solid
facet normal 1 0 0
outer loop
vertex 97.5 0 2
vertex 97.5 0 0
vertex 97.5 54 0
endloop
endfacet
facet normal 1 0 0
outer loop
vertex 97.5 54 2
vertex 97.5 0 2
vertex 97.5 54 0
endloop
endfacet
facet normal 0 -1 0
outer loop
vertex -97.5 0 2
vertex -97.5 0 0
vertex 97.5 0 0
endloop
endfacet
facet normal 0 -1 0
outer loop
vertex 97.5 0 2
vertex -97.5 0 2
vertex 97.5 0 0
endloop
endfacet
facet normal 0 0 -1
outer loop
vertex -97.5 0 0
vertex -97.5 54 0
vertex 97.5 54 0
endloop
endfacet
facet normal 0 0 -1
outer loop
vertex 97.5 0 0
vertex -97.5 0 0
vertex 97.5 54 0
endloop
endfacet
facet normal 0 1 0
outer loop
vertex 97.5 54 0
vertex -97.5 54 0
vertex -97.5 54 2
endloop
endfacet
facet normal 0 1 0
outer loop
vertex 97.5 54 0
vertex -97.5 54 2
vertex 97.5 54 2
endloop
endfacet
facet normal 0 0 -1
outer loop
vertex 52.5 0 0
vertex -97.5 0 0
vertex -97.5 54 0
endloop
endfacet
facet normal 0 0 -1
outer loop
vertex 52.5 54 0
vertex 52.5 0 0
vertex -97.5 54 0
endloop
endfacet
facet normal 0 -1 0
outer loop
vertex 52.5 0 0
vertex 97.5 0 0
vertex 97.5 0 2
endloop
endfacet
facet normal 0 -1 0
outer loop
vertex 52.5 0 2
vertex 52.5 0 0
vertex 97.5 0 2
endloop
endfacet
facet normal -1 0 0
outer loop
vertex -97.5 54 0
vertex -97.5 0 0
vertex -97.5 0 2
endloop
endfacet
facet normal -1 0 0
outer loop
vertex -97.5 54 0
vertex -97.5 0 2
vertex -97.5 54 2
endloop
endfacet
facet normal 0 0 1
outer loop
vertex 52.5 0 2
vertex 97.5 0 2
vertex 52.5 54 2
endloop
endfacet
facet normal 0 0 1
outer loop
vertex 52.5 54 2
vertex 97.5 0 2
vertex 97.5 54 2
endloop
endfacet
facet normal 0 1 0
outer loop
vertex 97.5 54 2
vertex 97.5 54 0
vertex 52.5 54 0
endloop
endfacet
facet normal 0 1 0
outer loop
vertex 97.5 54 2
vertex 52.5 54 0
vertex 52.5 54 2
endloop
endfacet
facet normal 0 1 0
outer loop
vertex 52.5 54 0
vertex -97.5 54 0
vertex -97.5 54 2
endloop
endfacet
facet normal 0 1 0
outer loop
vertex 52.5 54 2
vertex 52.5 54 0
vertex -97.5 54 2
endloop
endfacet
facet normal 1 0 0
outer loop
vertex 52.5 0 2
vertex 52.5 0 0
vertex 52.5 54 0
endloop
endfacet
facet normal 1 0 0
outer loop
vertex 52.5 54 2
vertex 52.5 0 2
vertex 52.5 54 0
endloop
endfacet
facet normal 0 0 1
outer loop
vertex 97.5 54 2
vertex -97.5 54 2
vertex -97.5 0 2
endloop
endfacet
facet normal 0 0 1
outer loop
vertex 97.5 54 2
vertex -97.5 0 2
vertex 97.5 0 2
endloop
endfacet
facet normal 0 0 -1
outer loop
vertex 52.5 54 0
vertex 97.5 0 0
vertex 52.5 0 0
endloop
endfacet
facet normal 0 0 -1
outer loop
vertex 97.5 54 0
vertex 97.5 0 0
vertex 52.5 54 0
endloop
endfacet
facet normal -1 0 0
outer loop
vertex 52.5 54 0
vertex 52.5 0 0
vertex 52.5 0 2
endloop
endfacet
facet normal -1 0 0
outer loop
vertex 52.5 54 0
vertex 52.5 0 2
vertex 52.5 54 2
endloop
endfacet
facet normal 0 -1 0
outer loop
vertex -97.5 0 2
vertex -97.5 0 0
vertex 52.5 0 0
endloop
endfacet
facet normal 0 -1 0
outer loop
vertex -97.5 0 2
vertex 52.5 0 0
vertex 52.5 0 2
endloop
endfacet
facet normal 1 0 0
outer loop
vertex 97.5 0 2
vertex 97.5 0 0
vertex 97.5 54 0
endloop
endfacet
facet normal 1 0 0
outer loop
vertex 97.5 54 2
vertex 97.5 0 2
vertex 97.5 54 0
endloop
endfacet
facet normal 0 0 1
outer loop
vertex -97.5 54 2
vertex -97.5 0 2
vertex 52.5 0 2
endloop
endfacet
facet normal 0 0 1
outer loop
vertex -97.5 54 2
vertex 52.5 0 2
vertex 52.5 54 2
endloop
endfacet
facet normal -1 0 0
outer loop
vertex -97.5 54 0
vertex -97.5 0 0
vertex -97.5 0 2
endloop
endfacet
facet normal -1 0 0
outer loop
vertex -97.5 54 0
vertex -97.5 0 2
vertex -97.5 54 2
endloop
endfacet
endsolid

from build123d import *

# Parameters (mm, degrees)
F0_W     = 195
F0_H     = 54
F1_DEPTH = 2
F2_DEPTH = 150
F3_DEPTH = 45


with BuildPart() as f1:
    # F0 (on Top) → F1 (new body)
    with BuildSketch(Plane.XY):
        with Locations((0, 27)):
            Rectangle(F0_W, F0_H)
    extrude(amount=F1_DEPTH)


with BuildPart() as f2:
    # F2 (new): a face of the model
    f2_faces = [f1.part.faces().sort_by_distance(p)[0] for p in [
        (-97.5, 27, 1),
    ]]
    extrude(f2_faces, amount=-F2_DEPTH)


with BuildPart() as f3:
    # F3 (new, through all): a face of the model
    f3_faces = [f1.part.faces().sort_by_distance(p)[0] for p in [
        (97.5, 27, 1),
    ]]
    extrude(f3_faces, amount=-F3_DEPTH)


solid = Compound([f1.part, f2.part, f3.part])
